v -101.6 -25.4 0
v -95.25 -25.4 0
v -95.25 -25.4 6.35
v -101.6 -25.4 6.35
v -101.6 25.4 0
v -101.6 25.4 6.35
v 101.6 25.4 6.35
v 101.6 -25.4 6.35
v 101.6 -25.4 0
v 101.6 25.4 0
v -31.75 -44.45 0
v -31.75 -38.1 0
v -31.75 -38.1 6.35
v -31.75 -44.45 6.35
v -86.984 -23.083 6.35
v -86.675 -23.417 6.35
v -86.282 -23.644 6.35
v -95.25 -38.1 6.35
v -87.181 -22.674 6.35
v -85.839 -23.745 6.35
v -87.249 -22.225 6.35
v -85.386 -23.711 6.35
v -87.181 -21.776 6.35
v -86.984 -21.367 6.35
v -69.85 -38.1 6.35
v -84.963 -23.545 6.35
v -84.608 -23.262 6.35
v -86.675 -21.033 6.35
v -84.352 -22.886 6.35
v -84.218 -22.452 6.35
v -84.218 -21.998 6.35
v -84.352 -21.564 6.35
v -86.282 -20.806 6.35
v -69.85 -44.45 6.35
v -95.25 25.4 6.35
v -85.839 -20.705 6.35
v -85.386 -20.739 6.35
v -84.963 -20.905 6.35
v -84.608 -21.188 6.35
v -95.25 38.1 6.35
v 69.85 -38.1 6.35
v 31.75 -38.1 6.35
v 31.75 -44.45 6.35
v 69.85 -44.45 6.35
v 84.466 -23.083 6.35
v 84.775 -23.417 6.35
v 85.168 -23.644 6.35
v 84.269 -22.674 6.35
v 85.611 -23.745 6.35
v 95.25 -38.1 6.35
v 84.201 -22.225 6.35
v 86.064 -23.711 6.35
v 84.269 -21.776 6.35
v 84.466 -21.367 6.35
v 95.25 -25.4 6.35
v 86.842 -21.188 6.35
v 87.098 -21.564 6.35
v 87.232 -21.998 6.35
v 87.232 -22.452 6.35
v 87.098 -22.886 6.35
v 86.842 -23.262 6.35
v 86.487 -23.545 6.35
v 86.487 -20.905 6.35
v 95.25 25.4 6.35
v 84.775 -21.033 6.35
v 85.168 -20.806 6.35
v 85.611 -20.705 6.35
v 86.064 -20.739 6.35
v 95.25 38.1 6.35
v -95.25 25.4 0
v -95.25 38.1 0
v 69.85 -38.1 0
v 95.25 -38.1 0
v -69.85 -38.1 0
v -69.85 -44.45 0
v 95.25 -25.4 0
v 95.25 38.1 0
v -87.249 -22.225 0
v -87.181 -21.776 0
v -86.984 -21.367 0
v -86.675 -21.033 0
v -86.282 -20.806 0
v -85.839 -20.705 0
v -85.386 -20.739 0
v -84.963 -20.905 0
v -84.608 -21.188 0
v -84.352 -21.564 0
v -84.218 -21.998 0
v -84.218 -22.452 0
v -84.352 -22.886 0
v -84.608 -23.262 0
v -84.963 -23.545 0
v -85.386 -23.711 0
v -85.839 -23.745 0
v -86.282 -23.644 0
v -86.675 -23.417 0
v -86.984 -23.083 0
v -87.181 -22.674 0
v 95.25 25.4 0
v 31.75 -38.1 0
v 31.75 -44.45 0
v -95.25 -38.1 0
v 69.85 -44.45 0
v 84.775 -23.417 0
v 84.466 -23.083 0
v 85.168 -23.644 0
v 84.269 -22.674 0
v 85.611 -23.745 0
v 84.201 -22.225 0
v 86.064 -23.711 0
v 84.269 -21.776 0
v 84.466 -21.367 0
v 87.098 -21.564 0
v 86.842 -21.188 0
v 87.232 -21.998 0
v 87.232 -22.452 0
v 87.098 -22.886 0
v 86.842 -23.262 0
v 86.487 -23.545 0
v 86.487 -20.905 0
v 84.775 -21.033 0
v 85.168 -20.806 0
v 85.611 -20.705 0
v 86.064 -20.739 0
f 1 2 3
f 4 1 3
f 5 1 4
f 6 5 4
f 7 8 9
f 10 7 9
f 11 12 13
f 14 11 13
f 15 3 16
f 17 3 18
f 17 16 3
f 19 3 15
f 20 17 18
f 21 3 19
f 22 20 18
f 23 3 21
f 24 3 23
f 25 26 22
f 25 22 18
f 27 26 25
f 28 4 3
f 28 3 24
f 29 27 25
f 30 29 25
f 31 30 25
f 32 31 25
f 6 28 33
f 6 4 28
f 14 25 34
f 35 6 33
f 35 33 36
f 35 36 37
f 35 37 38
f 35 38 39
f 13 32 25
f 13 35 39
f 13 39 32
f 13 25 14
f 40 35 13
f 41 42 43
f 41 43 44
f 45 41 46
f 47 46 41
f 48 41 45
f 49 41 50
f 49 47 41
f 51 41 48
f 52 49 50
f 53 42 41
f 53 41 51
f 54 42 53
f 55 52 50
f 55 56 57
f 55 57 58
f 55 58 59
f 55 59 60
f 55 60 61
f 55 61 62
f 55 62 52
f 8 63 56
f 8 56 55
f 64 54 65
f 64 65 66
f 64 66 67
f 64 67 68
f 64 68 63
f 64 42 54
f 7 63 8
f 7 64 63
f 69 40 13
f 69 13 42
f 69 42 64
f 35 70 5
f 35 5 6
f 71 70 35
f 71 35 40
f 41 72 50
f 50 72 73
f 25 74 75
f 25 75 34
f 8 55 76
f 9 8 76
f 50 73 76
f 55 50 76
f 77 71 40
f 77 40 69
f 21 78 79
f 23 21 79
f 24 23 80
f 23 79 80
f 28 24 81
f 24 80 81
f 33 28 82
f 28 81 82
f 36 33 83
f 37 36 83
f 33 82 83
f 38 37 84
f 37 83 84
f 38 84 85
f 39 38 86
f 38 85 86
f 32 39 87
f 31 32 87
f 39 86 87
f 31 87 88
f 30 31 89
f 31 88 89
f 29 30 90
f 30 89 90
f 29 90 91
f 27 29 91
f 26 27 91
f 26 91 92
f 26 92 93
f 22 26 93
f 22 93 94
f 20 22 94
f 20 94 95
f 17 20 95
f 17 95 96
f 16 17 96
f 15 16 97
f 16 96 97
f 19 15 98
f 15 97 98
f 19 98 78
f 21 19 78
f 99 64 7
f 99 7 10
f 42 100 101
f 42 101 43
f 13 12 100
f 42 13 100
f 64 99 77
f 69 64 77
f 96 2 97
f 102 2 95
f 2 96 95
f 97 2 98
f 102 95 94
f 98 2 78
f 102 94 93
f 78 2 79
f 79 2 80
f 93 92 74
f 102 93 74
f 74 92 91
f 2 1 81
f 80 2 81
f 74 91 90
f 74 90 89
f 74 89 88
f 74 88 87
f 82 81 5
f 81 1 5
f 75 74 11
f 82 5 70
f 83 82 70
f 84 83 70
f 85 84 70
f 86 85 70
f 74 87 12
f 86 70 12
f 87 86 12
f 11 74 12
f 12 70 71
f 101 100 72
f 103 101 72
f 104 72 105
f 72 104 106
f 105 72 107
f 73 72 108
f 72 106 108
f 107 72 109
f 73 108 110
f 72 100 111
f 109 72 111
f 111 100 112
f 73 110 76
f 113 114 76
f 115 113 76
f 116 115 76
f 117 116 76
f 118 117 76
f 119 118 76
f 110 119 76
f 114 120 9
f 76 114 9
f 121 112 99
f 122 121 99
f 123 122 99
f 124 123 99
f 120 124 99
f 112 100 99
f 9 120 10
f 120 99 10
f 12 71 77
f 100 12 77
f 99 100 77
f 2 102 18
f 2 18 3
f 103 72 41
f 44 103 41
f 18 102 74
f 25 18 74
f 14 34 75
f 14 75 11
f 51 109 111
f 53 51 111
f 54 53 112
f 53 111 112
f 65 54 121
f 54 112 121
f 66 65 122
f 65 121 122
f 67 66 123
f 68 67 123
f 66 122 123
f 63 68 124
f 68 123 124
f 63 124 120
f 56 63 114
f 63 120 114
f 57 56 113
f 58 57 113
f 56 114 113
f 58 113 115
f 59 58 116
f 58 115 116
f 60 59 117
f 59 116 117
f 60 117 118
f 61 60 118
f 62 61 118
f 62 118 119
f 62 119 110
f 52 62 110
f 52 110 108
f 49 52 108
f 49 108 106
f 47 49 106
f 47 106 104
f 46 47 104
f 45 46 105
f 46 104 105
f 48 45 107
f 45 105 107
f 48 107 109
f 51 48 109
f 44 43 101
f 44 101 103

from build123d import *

# Parameters (mm, degrees)
SKETCH1_W           = 190.5
SKETCH1_H           = 76.2
BOSS_EXTRUDE1_DEPTH = 6.35
SKETCH2_W           = 6.35
SKETCH2_H           = 50.8
BOSS_EXTRUDE2_DEPTH = 6.35
SKETCH3_W           = 6.35
SKETCH3_H           = 50.8
BOSS_EXTRUDE3_DEPTH = 6.35
SKETCH4_W           = 38.1
SKETCH4_H           = 6.35
BOSS_EXTRUDE4_DEPTH = 6.35
SKETCH6_R           = 1.524
CUT_EXTRUDE4_DEPTH  = 6.35


with BuildPart() as part:
    # Sketch1 → Boss-Extrude1 (new body)
    with BuildSketch(Plane.XY):
        Rectangle(SKETCH1_W, SKETCH1_H)
    extrude(amount=BOSS_EXTRUDE1_DEPTH)

    # Sketch2 → Boss-Extrude2 (add)
    with BuildSketch(Plane.ZY.offset(95.25)):
        with Locations((3.175, 0)):
            Rectangle(SKETCH2_W, SKETCH2_H)
    extrude(amount=BOSS_EXTRUDE2_DEPTH)

    # Sketch3 → Boss-Extrude3 (add)
    with BuildSketch(Plane(origin=(95.25, 0, 0), x_dir=(0, 0, -1), z_dir=(1, 0, 0))):
        with Locations((-3.175, 0)):
            Rectangle(SKETCH3_W, SKETCH3_H)
    extrude(amount=BOSS_EXTRUDE3_DEPTH)

    # Sketch4 → Boss-Extrude4 (add)
    with BuildSketch(Plane.XZ.offset(38.1)):
        with Locations((-50.8, 3.175)):
            Rectangle(SKETCH4_W, SKETCH4_H)
        with Locations((50.8, 3.175)):
            Rectangle(SKETCH4_W, SKETCH4_H)
    extrude(amount=BOSS_EXTRUDE4_DEPTH)

    # Sketch6 → Cut-Extrude4 (cut)
    with BuildSketch(Plane(origin=(23.763692911, 98.5857123, 0), x_dir=(-1, 0, 0), z_dir=(0, 0, -1))):
        with Locations((-61.961307089, -120.8107123)):
            Circle(SKETCH6_R)
        with Locations((109.488692911, -120.8107123)):
            Circle(SKETCH6_R)
    extrude(amount=-CUT_EXTRUDE4_DEPTH, mode=Mode.SUBTRACT)


solid = part.part
